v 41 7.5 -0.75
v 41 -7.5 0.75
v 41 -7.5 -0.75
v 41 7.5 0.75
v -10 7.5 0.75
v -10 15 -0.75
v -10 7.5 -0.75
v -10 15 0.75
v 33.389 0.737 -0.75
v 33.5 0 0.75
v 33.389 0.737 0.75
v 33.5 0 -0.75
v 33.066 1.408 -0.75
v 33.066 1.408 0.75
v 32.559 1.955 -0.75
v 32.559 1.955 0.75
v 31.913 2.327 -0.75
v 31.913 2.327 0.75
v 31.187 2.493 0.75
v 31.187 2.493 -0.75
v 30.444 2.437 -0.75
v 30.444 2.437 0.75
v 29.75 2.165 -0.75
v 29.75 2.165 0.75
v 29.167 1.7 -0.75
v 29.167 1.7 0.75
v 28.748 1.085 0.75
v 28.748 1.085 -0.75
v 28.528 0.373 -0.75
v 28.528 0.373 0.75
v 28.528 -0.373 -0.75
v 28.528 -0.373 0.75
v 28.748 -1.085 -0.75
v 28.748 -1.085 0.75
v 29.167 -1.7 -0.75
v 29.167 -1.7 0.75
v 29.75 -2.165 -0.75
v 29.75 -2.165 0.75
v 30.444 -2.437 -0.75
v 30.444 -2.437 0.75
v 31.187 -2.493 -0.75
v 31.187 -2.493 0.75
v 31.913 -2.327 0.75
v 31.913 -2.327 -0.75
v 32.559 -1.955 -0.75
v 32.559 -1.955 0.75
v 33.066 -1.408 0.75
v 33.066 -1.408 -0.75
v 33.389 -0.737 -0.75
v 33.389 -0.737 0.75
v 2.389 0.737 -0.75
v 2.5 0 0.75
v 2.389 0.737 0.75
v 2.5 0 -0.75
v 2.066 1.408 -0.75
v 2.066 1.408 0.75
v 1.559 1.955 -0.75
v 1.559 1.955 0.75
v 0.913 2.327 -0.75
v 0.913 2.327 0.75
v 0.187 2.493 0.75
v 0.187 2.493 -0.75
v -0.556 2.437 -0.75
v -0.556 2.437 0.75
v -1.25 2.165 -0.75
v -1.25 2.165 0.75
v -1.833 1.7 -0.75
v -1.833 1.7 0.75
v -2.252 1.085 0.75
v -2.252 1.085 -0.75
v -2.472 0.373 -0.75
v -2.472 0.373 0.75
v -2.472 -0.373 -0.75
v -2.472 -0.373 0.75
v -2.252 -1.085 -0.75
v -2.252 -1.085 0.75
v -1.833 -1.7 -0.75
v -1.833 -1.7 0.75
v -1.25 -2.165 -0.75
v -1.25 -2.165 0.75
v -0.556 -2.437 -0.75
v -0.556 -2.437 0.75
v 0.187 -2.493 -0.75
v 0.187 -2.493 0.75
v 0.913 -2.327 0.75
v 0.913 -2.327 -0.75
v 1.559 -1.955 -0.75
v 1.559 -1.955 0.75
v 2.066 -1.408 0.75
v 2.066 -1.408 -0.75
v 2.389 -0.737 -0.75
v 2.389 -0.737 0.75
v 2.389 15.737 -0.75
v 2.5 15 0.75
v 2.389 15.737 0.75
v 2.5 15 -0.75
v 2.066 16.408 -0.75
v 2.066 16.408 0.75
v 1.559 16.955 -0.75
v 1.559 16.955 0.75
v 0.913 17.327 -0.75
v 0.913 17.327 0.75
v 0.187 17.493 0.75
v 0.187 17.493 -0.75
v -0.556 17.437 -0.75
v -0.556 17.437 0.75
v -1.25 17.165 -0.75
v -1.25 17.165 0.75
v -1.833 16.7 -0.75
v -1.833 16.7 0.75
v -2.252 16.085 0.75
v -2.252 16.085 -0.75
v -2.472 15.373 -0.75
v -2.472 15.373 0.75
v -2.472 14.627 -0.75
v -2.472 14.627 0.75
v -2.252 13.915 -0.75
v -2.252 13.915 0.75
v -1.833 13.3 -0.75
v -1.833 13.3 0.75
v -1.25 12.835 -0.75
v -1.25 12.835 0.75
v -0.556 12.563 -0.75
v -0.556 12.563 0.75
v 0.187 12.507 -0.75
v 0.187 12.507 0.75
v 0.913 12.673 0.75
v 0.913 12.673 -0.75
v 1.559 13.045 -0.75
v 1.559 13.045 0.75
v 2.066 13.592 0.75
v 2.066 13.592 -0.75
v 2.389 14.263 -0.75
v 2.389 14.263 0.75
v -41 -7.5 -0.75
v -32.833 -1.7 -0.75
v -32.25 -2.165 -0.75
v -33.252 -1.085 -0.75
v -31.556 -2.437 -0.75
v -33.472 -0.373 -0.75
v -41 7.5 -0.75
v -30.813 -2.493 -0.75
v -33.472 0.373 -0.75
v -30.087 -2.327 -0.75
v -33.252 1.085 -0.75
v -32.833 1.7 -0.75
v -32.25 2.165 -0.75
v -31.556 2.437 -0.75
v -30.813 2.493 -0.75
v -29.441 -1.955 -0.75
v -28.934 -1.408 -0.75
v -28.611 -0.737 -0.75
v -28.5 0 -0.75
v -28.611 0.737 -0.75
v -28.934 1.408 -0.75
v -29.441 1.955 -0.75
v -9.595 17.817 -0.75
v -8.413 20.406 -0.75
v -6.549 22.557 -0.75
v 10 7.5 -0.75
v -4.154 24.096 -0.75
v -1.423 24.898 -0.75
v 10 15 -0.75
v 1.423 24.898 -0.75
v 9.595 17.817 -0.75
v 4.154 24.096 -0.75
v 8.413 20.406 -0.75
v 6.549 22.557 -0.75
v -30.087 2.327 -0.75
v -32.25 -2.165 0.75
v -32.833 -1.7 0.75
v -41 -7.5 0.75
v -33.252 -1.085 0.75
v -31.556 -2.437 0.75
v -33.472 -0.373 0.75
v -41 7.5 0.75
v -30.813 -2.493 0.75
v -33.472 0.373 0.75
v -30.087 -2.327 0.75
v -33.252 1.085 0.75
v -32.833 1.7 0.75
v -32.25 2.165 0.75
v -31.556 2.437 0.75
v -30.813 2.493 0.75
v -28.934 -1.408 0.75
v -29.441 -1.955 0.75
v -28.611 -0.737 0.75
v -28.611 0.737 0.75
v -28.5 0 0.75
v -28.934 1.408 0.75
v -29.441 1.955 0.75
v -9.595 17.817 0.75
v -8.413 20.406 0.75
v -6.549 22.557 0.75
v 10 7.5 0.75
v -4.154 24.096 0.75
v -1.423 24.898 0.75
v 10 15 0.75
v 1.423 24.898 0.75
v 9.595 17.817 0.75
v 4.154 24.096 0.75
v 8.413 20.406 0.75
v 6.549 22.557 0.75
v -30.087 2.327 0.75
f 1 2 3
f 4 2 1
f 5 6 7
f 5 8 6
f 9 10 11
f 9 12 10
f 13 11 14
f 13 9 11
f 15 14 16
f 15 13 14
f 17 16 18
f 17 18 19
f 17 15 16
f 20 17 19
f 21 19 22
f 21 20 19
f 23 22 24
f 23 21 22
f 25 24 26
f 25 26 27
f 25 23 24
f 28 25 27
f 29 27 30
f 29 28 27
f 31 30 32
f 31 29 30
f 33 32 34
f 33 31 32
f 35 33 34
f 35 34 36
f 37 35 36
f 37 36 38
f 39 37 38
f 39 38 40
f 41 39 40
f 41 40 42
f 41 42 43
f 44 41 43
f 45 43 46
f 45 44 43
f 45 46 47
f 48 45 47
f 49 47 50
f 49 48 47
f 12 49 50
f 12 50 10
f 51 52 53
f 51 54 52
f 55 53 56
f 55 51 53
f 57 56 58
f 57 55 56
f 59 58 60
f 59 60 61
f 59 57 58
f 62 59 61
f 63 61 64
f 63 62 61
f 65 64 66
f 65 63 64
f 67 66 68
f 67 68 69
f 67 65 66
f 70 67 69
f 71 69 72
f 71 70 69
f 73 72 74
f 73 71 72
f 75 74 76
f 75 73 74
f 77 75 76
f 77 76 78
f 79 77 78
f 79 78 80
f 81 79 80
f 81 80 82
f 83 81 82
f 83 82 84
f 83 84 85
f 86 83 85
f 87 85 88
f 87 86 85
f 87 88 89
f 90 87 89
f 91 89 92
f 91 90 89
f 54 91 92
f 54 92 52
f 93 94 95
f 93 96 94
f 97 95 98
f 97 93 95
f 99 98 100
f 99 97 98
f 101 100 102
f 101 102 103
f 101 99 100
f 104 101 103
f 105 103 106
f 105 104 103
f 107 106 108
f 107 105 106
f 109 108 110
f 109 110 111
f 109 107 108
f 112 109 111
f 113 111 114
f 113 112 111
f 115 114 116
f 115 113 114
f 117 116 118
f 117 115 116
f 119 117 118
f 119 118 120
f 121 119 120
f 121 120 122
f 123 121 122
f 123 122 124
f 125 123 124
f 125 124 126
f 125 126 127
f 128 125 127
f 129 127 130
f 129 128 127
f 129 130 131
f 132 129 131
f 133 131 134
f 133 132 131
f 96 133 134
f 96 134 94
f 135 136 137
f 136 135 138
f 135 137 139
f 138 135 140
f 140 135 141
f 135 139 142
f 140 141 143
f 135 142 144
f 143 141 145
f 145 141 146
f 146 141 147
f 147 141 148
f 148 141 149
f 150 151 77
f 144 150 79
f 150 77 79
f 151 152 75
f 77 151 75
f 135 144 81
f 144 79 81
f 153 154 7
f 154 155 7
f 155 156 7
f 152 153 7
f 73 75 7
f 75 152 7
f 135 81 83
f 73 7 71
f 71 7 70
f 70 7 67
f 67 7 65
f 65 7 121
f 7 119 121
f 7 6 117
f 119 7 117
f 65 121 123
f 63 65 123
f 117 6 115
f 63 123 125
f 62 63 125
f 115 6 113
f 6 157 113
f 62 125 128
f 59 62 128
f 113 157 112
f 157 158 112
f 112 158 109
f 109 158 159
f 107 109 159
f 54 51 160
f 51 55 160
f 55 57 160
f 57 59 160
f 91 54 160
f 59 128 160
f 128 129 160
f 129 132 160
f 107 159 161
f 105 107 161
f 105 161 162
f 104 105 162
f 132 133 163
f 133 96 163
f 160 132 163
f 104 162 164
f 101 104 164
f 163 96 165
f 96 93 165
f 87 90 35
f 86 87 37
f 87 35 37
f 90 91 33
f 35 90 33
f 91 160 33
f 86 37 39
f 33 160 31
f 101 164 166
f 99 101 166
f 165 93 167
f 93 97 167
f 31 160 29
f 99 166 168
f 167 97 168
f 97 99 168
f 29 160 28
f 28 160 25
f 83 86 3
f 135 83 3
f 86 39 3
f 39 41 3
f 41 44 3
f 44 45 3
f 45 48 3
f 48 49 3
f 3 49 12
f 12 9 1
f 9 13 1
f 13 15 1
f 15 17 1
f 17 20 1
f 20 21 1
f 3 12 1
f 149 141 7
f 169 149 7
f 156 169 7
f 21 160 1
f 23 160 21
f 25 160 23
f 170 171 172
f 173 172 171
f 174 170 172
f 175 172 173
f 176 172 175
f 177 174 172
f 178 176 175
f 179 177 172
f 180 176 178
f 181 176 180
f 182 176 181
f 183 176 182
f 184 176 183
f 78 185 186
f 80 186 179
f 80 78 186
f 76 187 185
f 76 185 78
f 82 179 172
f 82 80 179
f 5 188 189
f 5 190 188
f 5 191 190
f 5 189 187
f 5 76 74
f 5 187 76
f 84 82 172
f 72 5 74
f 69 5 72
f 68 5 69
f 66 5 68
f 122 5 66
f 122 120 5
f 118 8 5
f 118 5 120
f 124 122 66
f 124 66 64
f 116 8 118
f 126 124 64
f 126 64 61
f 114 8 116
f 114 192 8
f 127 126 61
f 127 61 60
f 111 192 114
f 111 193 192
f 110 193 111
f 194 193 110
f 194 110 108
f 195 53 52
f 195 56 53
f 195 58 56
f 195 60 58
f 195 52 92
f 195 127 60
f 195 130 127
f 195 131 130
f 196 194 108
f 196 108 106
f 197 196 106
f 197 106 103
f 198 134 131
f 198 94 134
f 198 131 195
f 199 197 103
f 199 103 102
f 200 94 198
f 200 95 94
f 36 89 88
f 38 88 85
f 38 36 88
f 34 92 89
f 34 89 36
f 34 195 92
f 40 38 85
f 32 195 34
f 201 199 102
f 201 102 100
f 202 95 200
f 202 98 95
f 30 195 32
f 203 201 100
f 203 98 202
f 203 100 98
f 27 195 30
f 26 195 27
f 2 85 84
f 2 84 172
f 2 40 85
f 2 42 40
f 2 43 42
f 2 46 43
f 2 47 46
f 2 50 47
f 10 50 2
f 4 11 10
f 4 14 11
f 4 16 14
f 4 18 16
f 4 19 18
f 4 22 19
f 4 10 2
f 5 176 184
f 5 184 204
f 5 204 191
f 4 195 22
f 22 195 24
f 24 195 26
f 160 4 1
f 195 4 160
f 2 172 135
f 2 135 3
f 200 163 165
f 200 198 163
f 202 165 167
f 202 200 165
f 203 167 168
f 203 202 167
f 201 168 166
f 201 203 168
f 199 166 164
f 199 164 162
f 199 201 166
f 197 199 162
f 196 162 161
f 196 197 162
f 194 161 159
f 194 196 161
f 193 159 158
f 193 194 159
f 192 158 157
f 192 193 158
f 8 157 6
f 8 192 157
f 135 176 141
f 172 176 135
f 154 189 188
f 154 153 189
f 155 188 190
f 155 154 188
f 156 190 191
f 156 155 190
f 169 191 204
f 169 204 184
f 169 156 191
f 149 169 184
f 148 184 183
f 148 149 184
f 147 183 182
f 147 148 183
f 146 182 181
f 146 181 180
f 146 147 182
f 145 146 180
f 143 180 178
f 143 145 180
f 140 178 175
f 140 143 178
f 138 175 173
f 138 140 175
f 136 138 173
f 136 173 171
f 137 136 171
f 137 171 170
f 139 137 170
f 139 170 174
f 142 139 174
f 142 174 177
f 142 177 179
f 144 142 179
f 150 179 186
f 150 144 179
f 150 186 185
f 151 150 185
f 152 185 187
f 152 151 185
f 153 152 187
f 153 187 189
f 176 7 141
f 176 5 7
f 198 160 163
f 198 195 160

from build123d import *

# Parameters (mm, degrees)
F0_R     = 2.5
F1_DEPTH = 0.75


with BuildPart() as f1:
    # F0 (on Top) → F1 (new body, symmetric)
    with BuildSketch(Plane.XY):
        with BuildLine():
            Line((-10, 7.5), (-41, 7.5))
            Line((-41, 7.5), (-41, -7.5))
            Line((-41, -7.5), (41, -7.5))
            Line((41, -7.5), (41, 7.5))
            Line((41, 7.5), (10, 7.5))
            Line((10, 7.5), (10, 15))
            ThreePointArc((10, 15), (0, 25), (-10, 15))
            Line((-10, 15), (-10, 7.5))
        make_face()
        with Locations((-31, 0)):
            Circle(F0_R, mode=Mode.SUBTRACT)
        Circle(F0_R, mode=Mode.SUBTRACT)
        with Locations((31, 0)):
            Circle(F0_R, mode=Mode.SUBTRACT)
        with Locations((0, 15)):
            Circle(F0_R, mode=Mode.SUBTRACT)
    extrude(amount=F1_DEPTH, both=True)


solid = f1.part
